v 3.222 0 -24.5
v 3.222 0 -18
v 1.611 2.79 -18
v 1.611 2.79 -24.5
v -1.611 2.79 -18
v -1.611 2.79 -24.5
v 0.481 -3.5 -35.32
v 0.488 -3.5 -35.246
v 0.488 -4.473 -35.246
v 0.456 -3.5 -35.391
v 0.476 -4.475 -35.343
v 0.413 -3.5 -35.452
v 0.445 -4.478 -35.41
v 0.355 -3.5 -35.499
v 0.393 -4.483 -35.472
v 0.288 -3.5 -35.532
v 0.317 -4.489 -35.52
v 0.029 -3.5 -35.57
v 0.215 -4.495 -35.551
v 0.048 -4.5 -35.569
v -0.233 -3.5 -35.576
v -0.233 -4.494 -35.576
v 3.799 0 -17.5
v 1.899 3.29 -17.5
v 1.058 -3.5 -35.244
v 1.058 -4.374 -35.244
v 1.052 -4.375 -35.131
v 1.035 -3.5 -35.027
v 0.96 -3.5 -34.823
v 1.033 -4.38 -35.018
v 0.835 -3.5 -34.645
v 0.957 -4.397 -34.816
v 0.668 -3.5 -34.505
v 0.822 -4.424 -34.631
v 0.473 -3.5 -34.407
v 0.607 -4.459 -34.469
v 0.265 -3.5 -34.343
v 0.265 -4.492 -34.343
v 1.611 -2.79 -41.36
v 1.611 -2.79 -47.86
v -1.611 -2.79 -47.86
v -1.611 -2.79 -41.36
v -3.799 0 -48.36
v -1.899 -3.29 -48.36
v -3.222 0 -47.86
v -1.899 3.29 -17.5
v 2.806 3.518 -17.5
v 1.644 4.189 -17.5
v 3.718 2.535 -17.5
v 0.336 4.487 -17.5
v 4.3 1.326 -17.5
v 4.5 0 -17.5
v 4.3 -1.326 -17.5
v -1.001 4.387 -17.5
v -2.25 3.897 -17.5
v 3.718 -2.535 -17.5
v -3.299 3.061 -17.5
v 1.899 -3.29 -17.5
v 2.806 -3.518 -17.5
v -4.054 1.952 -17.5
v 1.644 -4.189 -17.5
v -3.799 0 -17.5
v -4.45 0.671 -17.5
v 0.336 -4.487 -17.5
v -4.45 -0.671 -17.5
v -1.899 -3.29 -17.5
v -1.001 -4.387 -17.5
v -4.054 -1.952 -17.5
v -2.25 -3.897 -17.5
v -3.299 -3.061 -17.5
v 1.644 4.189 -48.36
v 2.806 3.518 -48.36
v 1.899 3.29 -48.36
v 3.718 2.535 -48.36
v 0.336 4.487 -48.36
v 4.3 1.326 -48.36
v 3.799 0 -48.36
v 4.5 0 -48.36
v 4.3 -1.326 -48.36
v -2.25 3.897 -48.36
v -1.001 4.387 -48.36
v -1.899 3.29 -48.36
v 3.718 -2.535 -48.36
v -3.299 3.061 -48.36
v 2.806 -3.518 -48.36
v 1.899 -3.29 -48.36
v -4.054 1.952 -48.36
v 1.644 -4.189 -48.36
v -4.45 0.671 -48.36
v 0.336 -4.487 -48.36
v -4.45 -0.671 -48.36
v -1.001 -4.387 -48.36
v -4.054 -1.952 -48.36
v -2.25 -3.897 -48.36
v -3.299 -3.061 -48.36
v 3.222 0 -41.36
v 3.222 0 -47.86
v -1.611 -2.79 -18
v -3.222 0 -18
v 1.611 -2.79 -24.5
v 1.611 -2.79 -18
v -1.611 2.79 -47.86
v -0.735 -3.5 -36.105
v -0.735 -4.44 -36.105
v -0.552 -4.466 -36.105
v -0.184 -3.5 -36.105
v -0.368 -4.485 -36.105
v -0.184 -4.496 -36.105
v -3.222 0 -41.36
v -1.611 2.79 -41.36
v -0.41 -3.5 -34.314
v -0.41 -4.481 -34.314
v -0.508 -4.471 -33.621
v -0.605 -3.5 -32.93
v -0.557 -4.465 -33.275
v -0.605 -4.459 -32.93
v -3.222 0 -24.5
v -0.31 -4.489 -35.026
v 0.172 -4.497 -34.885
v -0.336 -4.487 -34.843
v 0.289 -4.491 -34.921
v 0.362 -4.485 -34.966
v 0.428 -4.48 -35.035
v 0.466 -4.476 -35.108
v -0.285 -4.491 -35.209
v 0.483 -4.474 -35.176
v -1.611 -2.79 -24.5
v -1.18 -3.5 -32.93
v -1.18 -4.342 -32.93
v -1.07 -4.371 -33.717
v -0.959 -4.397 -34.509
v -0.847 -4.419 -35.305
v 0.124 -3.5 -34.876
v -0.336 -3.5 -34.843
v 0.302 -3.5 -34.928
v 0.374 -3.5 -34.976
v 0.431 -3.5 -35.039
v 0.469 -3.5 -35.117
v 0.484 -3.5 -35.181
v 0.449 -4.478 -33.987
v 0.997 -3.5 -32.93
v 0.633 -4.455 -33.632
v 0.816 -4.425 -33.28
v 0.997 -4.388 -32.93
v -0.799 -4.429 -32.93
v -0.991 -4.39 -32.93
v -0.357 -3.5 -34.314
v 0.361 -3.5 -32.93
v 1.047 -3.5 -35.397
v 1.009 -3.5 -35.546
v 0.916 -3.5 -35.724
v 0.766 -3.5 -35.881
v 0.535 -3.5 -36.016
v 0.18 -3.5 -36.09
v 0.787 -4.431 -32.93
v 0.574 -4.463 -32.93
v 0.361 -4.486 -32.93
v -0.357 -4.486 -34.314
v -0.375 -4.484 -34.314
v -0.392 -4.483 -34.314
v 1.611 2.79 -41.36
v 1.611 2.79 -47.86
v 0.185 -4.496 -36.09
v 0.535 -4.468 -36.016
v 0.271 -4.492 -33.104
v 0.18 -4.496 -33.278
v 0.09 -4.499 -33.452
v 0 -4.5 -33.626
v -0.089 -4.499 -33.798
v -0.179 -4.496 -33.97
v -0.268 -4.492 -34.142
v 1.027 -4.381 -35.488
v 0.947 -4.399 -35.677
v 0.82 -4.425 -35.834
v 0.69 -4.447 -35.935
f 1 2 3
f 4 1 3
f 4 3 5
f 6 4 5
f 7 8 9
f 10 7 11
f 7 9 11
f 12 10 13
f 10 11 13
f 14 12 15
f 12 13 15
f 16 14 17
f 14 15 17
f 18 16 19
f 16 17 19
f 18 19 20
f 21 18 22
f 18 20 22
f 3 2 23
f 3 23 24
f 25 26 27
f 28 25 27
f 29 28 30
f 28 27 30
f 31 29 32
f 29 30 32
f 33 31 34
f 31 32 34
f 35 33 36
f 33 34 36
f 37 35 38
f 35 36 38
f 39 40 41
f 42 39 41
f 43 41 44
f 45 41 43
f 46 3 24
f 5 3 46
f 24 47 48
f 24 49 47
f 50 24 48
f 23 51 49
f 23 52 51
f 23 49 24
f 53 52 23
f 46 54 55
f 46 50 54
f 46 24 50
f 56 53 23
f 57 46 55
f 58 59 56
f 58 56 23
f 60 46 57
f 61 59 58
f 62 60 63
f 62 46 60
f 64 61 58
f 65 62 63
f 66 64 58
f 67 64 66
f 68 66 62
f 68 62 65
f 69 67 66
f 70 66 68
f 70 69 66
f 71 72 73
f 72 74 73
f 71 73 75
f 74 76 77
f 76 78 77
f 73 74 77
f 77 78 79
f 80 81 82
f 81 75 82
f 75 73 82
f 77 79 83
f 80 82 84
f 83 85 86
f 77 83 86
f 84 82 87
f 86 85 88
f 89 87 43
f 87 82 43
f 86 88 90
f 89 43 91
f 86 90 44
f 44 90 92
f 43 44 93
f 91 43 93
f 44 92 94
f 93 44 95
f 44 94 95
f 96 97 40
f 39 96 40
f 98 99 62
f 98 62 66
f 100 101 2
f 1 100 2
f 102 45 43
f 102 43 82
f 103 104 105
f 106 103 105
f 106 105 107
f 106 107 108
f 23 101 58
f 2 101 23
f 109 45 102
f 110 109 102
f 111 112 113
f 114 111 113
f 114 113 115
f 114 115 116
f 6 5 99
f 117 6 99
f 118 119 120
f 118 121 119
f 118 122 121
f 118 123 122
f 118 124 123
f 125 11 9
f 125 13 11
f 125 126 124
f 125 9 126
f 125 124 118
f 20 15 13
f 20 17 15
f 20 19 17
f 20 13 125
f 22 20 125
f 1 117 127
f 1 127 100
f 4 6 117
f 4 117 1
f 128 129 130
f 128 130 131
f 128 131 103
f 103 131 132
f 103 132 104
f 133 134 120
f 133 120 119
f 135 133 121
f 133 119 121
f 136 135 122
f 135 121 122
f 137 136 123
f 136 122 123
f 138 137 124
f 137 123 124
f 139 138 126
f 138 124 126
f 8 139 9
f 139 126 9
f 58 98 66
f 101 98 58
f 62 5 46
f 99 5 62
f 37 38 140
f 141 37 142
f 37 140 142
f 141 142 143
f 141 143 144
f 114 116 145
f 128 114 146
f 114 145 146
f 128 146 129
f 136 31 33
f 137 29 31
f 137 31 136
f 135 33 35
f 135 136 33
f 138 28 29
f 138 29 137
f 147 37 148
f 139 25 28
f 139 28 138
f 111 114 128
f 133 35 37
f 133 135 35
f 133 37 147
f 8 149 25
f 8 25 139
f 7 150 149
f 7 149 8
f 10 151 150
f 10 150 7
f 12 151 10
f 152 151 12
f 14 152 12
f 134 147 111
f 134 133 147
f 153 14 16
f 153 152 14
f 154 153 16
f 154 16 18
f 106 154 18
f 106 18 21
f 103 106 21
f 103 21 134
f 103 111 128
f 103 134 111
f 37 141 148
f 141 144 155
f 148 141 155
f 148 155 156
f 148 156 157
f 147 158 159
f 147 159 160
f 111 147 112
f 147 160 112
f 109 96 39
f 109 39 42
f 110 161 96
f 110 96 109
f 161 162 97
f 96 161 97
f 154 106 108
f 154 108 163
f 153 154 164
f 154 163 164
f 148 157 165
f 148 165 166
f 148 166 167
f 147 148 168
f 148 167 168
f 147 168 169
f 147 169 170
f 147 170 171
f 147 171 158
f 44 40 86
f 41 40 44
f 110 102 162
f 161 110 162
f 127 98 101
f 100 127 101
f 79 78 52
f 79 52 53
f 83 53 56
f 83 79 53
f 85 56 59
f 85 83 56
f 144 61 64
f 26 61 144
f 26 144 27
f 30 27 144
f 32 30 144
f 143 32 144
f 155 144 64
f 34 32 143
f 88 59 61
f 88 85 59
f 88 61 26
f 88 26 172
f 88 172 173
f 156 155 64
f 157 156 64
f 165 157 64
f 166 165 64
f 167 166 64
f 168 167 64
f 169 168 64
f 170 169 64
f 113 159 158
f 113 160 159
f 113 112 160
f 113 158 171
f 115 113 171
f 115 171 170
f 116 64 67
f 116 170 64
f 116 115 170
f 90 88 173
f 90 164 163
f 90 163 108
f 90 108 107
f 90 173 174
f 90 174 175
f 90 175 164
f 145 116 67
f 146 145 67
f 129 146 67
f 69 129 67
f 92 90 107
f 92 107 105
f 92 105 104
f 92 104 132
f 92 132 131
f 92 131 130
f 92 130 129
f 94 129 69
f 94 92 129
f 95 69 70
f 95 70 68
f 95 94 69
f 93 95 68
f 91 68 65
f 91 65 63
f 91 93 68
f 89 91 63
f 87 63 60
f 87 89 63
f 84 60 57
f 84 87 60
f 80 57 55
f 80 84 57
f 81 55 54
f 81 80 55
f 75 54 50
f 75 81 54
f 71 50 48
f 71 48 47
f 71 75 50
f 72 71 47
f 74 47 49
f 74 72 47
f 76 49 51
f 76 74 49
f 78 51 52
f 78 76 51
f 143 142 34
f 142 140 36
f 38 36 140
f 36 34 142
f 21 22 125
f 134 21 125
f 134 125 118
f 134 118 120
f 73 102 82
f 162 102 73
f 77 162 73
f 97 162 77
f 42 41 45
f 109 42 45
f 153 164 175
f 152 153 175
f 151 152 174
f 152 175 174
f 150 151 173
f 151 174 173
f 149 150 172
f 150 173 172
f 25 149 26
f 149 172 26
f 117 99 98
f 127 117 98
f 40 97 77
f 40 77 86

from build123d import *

# Parameters (mm, degrees)
SKETCH1_W          = 4.5
SKETCH1_H          = 30.85997733
CUT_EXTRUDE1_DEPTH = 7
CUT_EXTRUDE2_DEPTH = 7
CHAMFER1_SIZE      = 0.5
CUT_EXTRUDE3_DEPTH = 1


with BuildPart() as part:
    # Sketch1 → Revolve-Thin1 (revolve)
    with BuildSketch(Plane(origin=(0, 0, 0), x_dir=(1, 0, 0), z_dir=(0, 1, 0))):
        with Locations((2.25, 32.929988665)):
            Rectangle(SKETCH1_W, SKETCH1_H)
    revolve(axis=Axis((0, 0, 0), (0, 0, -1)))

    # Sketch2 → Cut-Extrude1 (cut)
    with BuildSketch(Plane.XY.offset(-17.5)):
        Polygon((1.610807251, 2.79), (-1.610807251, 2.79), (-3.221614502, 0), (-1.610807251, -2.79), (1.610807251, -2.79), (3.221614502, 0), align=None)
    extrude(amount=-CUT_EXTRUDE1_DEPTH, mode=Mode.SUBTRACT)

    # Sketch3 → Cut-Extrude2 (cut)
    with BuildSketch(Plane(origin=(0, 0, -48.35997733), x_dir=(-1, 0, 0), z_dir=(0, 0, -1))):
        Polygon((1.610807251, 2.79), (-1.610807251, 2.79), (-3.221614502, 0), (-1.610807251, -2.79), (1.610807251, -2.79), (3.221614502, 0), align=None)
    extrude(amount=-CUT_EXTRUDE2_DEPTH, mode=Mode.SUBTRACT)

    # Chamfer1
    chamfer1_edges = [part.edges().sort_by_distance(p)[0] for p in [
        (2.416210877, 1.395, -17.5),
        (0, 2.79, -17.5),
        (-2.416210877, 1.395, -17.5),
        (-2.416210877, -1.395, -17.5),
        (0, -2.79, -17.5),
        (2.416210877, -1.395, -17.5),
        (-2.416210877, 1.395, -48.35997733),
        (0, 2.79, -48.35997733),
        (2.416210877, 1.395, -48.35997733),
        (2.416210877, -1.395, -48.35997733),
        (0, -2.79, -48.35997733),
        (-2.416210877, -1.395, -48.35997733),
    ]]
    chamfer(chamfer1_edges, length=CHAMFER1_SIZE)

    # Sketch4 → Cut-Extrude3 (cut)
    with BuildSketch(Plane(origin=(0, -4.5, 0), x_dir=(1, 0, 0), z_dir=(0, 1, 0))):
        with BuildLine():
            Line((-0.735236378, 36.104988665), (-0.183809095, 36.104988665))
            add(Edge.make_bspline(
                [(-0.183809095, 36.104988665), (-0.142887229, 36.104821435), (-0.063984952, 36.104498996), (0.049479088, 36.099913909), (0.153619775, 36.092996425), (0.248313279, 36.083867435), (0.333638661, 36.071201473), (0.40941848, 36.055993448), (0.47613676, 36.039057193), (0.516147477, 36.02331892), (0.534890825, 36.015946197)],
                knots=[0, 0, 0, 0, 0.000122758, 0.000236692, 0.000340599, 0.000435844, 0.000522015, 0.000599225, 0.000667726, 0.000728098, 0.000728098, 0.000728098, 0.000728098], degree=3))
            add(Edge.make_bspline(
                [(0.534890825, 36.015946197), (0.555993425, 36.006429933), (0.597245667, 35.987827142), (0.656357727, 35.95629427), (0.711711569, 35.922324809), (0.762389804, 35.884637999), (0.8094619, 35.84482071), (0.852635966, 35.802494227), (0.891564361, 35.757008969), (0.926655631, 35.709180776), (0.957858636, 35.659071505), (0.984643202, 35.606434054), (1.007803352, 35.551714066), (1.025889509, 35.49431609), (1.04092128, 35.434929127), (1.050643284, 35.373178483), (1.057485172, 35.309272455), (1.058047365, 35.265888615), (1.058333333, 35.243820796)],
                knots=[0, 0, 0, 0, 6.9431e-05, 0.000135726, 0.000200852, 0.000264074, 0.000324989, 0.000385705, 0.00044524, 0.000504393, 0.000563519, 0.000622115, 0.000681412, 0.000741551, 0.000802483, 0.00086501, 0.000928929, 0.000995103, 0.000995103, 0.000995103, 0.000995103], degree=3))
            add(Edge.make_bspline(
                [(1.058333333, 35.243820796), (1.057660809, 35.216664827), (1.056333136, 35.163054546), (1.047657842, 35.083998974), (1.031477343, 35.008136947), (1.009687089, 34.93522949), (0.982690716, 34.864804536), (0.947875359, 34.798087533), (0.907633136, 34.733916018), (0.861157476, 34.67313132), (0.809209736, 34.61517584), (0.749228296, 34.563460322), (0.684531415, 34.51450675), (0.612461254, 34.471597247), (0.53499992, 34.431738139), (0.45038063, 34.397967081), (0.360191554, 34.366801607), (0.296952619, 34.351203721), (0.264583333, 34.343219835)],
                knots=[0, 0, 0, 0, 8.1472e-05, 0.00016084, 0.000238178, 0.00031384, 0.000388957, 0.000464053, 0.000539224, 0.00061593, 0.000693367, 0.000772226, 0.000853128, 0.000936463, 0.001023502, 0.00111421, 0.001209545, 0.001309511, 0.001309511, 0.001309511, 0.001309511], degree=3))
            Line((0.264583333, 34.343219835), (0.997275641, 32.929988665))
            Line((0.997275641, 32.929988665), (0.360621995, 32.929988665))
            Line((0.360621995, 32.929988665), (-0.356805889, 34.313963024))
            Line((-0.356805889, 34.313963024), (-0.41023137, 34.313963024))
            Line((-0.41023137, 34.313963024), (-0.605488782, 32.929988665))
            Line((-0.605488782, 32.929988665), (-1.180448718, 32.929988665))
            Line((-1.180448718, 32.929988665), (-0.735236378, 36.104988665))
        make_face()
        with BuildLine():
            add(Edge.make_bspline(
                [(-0.335817308, 34.843129691), (-0.294894066, 34.843508532), (-0.2166182, 34.84423316), (-0.104827079, 34.849303715), (-0.004219131, 34.857224722), (0.08509361, 34.868749131), (0.16339231, 34.882182886), (0.230523904, 34.899038904), (0.286593934, 34.919072013), (0.332485643, 34.942831056), (0.369661123, 34.970726112), (0.40183809, 35.00049459), (0.428631207, 35.033817084), (0.450737928, 35.070134204), (0.467788114, 35.109521218), (0.480083934, 35.152244969), (0.486882391, 35.198020591), (0.487927508, 35.229595041), (0.488461538, 35.245728849)],
                knots=[0, 0, 0, 0, 0.000122766, 0.000234821, 0.000335651, 0.000425427, 0.000504898, 0.000573853, 0.000632811, 0.000683169, 0.0007282, 0.000771845, 0.000814359, 0.000856026, 0.000899036, 0.000942718, 0.000989043, 0.001037447, 0.001037447, 0.001037447, 0.001037447], degree=3))
            add(Edge.make_bspline(
                [(0.488461538, 35.245728849), (0.487770257, 35.264022258), (0.486429265, 35.299508964), (0.474830234, 35.35062006), (0.454996287, 35.39698474), (0.427122393, 35.438159863), (0.392337213, 35.474465682), (0.349901429, 35.504369125), (0.300298842, 35.527903238), (0.253836196, 35.543471254), (0.210053836, 35.552396101), (0.169082237, 35.558639509), (0.120514754, 35.564294057), (0.064292994, 35.568668304), (0.000652546, 35.571550346), (-0.070576621, 35.574306307), (-0.149461846, 35.575296954), (-0.204585812, 35.575641686), (-0.23341847, 35.575821998)],
                knots=[0, 0, 0, 0, 5.483e-05, 0.000106364, 0.000156221, 0.00020526, 0.000254739, 0.000306272, 0.000360034, 0.000418964, 0.000452769, 0.000493968, 0.000543275, 0.000599421, 0.000663102, 0.000734382, 0.000813258, 0.000899759, 0.000899759, 0.000899759, 0.000899759], degree=3))
            Line((-0.23341847, 35.575821998), (-0.335817308, 34.843129691))
        make_face(mode=Mode.SUBTRACT)
    extrude(amount=CUT_EXTRUDE3_DEPTH, mode=Mode.SUBTRACT)


solid = part.part
